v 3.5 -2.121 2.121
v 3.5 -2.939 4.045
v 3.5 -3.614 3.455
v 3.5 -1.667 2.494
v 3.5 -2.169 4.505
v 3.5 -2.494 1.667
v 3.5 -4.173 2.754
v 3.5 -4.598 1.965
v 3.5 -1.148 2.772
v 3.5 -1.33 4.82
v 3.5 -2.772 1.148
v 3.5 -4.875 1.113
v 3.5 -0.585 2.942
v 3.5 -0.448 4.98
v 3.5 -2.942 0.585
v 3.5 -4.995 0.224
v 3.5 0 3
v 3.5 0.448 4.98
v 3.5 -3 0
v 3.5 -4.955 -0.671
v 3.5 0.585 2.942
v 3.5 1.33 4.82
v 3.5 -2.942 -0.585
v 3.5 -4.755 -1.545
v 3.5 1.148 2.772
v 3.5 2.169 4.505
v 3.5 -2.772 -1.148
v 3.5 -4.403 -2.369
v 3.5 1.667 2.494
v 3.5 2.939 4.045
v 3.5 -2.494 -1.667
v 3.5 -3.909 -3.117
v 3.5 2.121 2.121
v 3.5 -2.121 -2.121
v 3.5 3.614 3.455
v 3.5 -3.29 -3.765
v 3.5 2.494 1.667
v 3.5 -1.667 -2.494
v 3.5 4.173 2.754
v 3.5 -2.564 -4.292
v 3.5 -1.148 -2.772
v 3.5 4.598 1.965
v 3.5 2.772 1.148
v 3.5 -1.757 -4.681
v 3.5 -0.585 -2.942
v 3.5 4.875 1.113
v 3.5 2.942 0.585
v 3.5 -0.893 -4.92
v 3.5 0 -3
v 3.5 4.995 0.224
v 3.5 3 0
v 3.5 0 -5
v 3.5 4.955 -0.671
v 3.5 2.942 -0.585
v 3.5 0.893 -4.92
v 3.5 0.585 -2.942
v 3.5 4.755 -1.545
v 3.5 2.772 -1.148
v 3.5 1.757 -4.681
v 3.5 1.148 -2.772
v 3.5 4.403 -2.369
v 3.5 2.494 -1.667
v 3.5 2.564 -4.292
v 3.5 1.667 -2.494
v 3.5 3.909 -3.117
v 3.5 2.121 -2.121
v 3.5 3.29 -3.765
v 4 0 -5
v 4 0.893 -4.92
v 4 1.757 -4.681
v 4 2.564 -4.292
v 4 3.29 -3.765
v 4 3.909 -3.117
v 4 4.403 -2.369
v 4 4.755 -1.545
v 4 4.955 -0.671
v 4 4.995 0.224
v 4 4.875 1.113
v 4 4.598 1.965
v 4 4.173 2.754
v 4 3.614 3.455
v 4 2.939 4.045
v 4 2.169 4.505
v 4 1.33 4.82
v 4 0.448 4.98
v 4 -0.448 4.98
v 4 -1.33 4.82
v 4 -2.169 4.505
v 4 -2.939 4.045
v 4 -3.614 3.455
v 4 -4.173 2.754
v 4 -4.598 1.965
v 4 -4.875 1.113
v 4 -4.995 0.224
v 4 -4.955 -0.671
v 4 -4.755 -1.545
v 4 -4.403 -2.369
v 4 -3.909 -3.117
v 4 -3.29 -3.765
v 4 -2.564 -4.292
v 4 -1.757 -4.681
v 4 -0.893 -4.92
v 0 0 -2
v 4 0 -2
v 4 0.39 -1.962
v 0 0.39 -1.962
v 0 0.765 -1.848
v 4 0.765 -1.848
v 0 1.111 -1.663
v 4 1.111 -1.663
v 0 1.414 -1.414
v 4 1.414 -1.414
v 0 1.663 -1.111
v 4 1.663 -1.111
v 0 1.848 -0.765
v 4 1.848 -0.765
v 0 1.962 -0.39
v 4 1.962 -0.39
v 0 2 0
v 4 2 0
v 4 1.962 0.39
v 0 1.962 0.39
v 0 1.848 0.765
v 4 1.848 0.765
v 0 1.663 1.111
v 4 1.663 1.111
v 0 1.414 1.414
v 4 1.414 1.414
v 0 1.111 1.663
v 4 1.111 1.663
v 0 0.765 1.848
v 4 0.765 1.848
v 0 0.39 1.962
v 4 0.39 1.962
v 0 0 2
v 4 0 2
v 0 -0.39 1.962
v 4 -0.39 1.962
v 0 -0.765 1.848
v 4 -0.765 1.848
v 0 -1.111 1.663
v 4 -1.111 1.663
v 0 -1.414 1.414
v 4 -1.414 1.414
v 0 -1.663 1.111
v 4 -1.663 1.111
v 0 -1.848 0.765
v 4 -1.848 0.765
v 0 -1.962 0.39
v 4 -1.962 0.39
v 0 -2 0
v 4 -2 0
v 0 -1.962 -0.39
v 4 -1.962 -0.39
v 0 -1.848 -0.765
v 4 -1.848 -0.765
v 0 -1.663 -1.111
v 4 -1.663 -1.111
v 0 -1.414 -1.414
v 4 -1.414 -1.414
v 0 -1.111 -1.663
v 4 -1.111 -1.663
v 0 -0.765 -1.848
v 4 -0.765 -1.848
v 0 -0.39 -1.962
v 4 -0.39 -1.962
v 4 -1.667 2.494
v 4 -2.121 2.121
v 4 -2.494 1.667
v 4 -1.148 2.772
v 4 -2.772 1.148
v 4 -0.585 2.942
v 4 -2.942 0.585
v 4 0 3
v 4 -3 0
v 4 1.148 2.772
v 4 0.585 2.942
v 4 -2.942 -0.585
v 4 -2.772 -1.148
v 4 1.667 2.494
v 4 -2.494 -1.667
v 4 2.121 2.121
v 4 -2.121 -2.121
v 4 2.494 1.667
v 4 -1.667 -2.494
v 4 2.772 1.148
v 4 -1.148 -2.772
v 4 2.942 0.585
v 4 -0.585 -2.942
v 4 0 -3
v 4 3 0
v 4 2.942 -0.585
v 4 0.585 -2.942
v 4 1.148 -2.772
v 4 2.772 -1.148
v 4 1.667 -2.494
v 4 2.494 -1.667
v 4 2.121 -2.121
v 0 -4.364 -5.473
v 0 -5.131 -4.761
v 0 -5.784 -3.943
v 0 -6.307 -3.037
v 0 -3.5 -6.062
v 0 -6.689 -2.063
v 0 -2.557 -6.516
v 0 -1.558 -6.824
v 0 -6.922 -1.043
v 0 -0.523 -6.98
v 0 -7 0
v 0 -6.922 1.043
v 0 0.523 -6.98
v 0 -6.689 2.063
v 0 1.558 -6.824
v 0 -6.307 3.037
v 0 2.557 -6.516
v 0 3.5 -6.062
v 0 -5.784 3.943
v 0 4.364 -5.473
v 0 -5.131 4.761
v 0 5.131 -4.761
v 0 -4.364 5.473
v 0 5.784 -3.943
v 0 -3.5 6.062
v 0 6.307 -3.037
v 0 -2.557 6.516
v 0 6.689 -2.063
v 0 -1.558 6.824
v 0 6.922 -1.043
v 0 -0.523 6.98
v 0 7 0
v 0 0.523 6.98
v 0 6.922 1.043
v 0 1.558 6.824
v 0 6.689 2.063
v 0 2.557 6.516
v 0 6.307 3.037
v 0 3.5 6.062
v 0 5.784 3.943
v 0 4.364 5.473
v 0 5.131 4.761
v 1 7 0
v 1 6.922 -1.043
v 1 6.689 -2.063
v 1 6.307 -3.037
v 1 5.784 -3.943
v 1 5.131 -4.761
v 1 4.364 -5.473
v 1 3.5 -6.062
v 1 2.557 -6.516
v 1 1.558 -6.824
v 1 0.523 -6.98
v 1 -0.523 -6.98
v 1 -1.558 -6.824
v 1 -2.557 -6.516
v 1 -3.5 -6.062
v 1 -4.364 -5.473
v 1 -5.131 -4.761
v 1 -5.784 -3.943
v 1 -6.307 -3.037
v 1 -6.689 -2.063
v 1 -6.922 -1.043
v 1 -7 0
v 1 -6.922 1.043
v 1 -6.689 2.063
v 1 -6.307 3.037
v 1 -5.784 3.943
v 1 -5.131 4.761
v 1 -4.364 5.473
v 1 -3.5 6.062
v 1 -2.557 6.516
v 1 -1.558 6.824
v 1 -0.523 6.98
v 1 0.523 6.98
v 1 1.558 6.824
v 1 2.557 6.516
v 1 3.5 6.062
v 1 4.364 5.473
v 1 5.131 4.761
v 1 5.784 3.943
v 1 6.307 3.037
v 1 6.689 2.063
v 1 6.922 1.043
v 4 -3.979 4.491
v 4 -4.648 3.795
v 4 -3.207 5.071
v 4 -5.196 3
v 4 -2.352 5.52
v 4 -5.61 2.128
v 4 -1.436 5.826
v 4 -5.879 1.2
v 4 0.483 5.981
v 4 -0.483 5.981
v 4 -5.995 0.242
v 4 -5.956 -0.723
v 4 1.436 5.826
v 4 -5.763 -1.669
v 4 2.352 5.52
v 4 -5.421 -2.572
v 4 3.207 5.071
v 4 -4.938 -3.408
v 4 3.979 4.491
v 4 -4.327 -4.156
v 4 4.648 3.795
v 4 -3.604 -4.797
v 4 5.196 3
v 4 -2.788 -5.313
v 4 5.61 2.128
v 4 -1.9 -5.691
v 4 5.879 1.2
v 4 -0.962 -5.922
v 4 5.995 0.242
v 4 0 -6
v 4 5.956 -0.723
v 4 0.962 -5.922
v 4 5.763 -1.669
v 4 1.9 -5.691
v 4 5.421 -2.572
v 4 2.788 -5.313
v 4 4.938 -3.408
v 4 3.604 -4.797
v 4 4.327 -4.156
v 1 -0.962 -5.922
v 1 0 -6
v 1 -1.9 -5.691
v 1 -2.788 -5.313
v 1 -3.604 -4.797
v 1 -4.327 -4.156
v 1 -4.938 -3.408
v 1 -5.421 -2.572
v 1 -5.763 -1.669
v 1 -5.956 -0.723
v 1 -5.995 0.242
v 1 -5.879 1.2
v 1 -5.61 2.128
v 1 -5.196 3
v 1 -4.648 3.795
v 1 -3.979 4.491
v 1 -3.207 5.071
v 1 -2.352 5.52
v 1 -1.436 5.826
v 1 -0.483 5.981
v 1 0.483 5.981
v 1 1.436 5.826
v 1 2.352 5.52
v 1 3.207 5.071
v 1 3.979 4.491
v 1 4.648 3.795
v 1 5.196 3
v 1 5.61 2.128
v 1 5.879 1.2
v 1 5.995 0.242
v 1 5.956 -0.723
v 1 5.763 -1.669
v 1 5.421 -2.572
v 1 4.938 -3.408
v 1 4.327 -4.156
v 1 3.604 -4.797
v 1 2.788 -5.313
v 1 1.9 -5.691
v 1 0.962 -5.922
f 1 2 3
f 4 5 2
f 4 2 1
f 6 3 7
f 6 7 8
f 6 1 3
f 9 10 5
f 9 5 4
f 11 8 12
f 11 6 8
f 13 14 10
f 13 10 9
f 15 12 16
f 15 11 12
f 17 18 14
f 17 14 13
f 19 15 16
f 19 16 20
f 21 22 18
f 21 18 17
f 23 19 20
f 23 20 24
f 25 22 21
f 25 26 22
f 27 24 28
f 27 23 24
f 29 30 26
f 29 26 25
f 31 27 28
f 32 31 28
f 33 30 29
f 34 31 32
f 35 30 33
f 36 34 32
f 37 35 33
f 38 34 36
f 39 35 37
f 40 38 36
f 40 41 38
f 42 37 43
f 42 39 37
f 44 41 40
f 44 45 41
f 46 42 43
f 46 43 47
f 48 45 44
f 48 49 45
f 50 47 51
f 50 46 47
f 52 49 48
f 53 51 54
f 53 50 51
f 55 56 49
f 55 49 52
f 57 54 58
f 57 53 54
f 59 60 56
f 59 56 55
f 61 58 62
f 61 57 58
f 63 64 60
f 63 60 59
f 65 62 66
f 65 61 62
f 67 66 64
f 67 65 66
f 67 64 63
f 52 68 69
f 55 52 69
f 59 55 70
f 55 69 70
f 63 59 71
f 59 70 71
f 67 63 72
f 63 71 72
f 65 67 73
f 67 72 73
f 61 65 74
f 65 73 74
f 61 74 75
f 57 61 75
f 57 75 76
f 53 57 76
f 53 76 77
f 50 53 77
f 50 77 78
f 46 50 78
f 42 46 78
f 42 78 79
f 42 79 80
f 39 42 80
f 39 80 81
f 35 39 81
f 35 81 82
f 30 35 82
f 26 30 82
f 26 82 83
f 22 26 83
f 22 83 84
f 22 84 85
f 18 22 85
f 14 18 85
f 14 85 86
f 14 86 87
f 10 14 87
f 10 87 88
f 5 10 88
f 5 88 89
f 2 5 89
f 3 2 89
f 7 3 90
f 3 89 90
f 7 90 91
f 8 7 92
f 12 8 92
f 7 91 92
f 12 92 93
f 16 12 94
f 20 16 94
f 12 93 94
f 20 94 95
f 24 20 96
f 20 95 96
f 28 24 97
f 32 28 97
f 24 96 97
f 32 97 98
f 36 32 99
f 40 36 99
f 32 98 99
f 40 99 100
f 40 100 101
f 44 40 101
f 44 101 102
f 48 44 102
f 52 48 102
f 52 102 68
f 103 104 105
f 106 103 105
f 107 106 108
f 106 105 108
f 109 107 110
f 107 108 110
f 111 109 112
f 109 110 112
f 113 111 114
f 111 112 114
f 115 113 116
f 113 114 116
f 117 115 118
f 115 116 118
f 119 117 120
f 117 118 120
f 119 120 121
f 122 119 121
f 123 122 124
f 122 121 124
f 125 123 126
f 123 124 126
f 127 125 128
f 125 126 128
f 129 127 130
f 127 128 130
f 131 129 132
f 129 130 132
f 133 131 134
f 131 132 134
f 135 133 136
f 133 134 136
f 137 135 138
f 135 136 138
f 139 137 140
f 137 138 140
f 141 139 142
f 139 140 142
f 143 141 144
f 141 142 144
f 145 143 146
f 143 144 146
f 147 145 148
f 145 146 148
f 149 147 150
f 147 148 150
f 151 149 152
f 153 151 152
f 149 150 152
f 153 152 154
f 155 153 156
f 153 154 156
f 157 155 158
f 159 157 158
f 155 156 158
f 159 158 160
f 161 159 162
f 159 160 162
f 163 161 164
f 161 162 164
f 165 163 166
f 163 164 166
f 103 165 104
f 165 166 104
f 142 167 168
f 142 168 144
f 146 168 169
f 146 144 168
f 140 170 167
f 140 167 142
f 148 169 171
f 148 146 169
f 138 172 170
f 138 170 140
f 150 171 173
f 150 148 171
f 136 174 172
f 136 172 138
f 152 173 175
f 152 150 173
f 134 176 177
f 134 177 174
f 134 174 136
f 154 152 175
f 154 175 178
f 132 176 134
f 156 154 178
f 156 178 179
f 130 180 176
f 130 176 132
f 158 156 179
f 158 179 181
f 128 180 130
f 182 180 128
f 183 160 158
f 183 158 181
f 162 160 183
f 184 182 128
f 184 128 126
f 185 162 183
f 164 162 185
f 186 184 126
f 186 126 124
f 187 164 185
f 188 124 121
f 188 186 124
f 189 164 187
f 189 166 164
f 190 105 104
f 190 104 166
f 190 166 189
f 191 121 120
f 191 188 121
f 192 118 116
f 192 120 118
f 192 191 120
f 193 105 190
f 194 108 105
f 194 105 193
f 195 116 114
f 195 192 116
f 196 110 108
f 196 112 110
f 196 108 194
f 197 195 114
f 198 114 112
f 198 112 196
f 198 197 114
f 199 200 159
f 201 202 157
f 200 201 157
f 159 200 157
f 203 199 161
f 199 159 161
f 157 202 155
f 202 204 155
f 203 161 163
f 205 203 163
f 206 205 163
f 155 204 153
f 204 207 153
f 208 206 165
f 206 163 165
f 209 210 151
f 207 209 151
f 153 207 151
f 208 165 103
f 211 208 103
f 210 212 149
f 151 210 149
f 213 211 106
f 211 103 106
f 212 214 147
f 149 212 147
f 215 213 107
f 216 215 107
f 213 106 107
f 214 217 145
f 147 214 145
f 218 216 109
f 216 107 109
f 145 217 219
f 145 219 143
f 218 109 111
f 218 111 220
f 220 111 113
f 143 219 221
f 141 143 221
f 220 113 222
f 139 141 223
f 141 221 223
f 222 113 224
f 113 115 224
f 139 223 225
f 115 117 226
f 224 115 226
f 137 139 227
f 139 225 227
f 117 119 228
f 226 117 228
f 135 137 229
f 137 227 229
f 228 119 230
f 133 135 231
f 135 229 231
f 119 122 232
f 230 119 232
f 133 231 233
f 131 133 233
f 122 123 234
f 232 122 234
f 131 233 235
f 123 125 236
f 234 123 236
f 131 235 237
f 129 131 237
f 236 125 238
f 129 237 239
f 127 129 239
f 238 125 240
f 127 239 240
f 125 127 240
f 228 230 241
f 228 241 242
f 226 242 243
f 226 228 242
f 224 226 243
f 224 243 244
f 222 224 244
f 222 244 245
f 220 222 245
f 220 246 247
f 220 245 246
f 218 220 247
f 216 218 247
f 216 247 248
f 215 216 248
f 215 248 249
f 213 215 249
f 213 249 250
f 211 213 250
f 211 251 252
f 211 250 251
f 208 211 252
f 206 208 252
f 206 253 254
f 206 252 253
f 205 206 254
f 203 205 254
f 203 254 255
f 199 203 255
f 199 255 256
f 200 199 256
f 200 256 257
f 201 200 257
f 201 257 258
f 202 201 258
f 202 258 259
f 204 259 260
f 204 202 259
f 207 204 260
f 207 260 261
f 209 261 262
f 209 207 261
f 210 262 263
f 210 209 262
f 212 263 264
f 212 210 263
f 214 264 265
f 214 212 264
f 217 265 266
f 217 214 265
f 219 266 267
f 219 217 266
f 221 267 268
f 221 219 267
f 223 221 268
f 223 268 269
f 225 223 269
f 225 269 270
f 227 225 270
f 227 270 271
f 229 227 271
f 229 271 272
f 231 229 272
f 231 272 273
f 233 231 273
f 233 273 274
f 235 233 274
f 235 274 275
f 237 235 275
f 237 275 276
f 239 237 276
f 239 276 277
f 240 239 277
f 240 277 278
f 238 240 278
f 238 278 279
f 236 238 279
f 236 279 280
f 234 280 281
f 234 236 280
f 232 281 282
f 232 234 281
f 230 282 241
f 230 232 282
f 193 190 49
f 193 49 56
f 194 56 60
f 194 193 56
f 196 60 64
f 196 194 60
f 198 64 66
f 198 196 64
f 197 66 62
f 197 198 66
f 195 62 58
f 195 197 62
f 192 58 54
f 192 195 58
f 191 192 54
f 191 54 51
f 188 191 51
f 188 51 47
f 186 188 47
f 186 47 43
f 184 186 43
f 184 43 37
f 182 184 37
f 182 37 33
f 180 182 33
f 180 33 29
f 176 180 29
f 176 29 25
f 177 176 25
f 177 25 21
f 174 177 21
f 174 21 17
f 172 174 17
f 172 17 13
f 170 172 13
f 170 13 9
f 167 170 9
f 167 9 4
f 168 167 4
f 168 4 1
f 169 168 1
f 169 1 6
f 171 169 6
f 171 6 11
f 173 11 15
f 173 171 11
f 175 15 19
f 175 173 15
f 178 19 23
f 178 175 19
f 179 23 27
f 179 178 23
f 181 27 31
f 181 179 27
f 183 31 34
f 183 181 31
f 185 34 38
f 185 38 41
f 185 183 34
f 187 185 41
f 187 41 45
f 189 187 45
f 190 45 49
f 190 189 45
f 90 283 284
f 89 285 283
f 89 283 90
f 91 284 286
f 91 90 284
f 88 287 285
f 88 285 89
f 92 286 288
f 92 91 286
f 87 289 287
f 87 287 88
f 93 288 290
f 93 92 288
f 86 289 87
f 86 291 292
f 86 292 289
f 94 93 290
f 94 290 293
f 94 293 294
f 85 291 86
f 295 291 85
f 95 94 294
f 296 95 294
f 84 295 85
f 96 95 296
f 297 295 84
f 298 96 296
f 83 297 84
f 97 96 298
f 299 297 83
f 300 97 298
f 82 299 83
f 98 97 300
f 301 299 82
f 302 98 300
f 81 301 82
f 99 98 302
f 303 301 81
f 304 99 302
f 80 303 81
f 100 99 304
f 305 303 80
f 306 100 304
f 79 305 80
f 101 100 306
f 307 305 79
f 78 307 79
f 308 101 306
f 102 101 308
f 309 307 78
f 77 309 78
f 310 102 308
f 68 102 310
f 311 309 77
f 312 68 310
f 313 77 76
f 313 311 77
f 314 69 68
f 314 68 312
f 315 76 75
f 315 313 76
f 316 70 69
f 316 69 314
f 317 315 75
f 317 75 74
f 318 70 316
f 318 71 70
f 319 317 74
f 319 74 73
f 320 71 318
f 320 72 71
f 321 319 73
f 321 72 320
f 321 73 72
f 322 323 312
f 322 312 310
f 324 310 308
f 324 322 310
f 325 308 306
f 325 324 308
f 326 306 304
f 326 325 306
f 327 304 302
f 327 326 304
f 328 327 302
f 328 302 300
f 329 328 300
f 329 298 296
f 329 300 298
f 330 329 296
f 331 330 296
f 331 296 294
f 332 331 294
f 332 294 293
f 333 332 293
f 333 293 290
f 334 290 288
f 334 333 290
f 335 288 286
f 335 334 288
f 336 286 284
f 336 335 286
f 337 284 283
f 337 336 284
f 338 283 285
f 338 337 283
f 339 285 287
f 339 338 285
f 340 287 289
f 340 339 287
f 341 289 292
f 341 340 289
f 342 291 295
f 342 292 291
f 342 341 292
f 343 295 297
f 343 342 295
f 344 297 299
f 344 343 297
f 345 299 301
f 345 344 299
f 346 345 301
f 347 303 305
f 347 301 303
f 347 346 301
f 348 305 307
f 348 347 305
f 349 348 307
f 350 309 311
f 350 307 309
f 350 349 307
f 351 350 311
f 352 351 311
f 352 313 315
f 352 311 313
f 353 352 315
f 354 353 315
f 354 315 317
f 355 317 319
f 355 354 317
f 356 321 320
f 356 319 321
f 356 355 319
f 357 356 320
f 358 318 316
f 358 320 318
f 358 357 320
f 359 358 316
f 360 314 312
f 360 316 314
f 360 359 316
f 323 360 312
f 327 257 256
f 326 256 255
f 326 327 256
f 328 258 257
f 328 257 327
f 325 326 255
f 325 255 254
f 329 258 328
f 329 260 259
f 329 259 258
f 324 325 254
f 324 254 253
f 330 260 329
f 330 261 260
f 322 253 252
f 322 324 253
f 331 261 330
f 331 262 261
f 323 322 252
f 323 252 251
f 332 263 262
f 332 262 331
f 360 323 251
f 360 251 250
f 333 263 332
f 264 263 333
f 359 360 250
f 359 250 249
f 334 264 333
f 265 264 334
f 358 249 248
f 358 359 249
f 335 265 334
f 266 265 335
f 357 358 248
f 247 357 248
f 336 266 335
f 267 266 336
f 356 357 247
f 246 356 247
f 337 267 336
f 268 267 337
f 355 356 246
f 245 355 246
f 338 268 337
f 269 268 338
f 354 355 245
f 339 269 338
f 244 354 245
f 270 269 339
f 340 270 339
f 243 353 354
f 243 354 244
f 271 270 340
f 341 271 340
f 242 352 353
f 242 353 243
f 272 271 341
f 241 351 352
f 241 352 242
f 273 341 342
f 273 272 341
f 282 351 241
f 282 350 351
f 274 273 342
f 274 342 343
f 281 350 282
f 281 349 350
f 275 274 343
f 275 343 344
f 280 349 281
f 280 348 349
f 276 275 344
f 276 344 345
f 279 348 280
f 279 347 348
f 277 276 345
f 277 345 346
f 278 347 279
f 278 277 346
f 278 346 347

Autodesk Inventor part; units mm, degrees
ref_plane "YZ Plane" through (0, 0, 0) normal (1, 0, 0) x (0, 1, 0)
ref_plane "XZ Plane" through (0, 0, 0) normal (0, 1, 0) x (-1, 0, 0)
ref_plane "XY Plane" through (0, 0, 0) normal (0, 0, 1) x (1, 0, 0)
sketch "Эскиз1" plane through (0, 0, 0) normal (1, 0, 0) x (0, 1, 0)
  circle A0 centre (0, 0) radius 7
  dimension "d0" = 14
extrude "Выдавливание1" add sketch "Эскиз1" along normal blind 1
sketch "Эскиз2" plane through (1, 0, 0) normal (1, 0, 0) x (0, 0, -1)
  circle A0 centre (0, 0) radius 6
  dimension "d3" = 12
extrude "Выдавливание2" add sketch "Эскиз2" along normal blind 3
sketch "Эскиз3" plane through (4, 0, 0) normal (1, 0, 0) x (0, 0, -1)
  circle A0 centre (0, 0) radius 2
  dimension "d6" = 4
extrude "Выдавливание3" cut sketch "Эскиз3" against normal blind 10
sketch "Эскиз4" plane through (4, 0, 0) normal (1, 0, 0) x (0, 0, -1)
  circle A0 centre (0, 0) radius 3
  circle A1 centre (0, 0) radius 5
  dimension "d9" = 6
  dimension "d10" = 10
extrude "Выдавливание4" cut sketch "Эскиз4" against normal blind 0.5
properties part number "подшипник для катков" material "Титан"
